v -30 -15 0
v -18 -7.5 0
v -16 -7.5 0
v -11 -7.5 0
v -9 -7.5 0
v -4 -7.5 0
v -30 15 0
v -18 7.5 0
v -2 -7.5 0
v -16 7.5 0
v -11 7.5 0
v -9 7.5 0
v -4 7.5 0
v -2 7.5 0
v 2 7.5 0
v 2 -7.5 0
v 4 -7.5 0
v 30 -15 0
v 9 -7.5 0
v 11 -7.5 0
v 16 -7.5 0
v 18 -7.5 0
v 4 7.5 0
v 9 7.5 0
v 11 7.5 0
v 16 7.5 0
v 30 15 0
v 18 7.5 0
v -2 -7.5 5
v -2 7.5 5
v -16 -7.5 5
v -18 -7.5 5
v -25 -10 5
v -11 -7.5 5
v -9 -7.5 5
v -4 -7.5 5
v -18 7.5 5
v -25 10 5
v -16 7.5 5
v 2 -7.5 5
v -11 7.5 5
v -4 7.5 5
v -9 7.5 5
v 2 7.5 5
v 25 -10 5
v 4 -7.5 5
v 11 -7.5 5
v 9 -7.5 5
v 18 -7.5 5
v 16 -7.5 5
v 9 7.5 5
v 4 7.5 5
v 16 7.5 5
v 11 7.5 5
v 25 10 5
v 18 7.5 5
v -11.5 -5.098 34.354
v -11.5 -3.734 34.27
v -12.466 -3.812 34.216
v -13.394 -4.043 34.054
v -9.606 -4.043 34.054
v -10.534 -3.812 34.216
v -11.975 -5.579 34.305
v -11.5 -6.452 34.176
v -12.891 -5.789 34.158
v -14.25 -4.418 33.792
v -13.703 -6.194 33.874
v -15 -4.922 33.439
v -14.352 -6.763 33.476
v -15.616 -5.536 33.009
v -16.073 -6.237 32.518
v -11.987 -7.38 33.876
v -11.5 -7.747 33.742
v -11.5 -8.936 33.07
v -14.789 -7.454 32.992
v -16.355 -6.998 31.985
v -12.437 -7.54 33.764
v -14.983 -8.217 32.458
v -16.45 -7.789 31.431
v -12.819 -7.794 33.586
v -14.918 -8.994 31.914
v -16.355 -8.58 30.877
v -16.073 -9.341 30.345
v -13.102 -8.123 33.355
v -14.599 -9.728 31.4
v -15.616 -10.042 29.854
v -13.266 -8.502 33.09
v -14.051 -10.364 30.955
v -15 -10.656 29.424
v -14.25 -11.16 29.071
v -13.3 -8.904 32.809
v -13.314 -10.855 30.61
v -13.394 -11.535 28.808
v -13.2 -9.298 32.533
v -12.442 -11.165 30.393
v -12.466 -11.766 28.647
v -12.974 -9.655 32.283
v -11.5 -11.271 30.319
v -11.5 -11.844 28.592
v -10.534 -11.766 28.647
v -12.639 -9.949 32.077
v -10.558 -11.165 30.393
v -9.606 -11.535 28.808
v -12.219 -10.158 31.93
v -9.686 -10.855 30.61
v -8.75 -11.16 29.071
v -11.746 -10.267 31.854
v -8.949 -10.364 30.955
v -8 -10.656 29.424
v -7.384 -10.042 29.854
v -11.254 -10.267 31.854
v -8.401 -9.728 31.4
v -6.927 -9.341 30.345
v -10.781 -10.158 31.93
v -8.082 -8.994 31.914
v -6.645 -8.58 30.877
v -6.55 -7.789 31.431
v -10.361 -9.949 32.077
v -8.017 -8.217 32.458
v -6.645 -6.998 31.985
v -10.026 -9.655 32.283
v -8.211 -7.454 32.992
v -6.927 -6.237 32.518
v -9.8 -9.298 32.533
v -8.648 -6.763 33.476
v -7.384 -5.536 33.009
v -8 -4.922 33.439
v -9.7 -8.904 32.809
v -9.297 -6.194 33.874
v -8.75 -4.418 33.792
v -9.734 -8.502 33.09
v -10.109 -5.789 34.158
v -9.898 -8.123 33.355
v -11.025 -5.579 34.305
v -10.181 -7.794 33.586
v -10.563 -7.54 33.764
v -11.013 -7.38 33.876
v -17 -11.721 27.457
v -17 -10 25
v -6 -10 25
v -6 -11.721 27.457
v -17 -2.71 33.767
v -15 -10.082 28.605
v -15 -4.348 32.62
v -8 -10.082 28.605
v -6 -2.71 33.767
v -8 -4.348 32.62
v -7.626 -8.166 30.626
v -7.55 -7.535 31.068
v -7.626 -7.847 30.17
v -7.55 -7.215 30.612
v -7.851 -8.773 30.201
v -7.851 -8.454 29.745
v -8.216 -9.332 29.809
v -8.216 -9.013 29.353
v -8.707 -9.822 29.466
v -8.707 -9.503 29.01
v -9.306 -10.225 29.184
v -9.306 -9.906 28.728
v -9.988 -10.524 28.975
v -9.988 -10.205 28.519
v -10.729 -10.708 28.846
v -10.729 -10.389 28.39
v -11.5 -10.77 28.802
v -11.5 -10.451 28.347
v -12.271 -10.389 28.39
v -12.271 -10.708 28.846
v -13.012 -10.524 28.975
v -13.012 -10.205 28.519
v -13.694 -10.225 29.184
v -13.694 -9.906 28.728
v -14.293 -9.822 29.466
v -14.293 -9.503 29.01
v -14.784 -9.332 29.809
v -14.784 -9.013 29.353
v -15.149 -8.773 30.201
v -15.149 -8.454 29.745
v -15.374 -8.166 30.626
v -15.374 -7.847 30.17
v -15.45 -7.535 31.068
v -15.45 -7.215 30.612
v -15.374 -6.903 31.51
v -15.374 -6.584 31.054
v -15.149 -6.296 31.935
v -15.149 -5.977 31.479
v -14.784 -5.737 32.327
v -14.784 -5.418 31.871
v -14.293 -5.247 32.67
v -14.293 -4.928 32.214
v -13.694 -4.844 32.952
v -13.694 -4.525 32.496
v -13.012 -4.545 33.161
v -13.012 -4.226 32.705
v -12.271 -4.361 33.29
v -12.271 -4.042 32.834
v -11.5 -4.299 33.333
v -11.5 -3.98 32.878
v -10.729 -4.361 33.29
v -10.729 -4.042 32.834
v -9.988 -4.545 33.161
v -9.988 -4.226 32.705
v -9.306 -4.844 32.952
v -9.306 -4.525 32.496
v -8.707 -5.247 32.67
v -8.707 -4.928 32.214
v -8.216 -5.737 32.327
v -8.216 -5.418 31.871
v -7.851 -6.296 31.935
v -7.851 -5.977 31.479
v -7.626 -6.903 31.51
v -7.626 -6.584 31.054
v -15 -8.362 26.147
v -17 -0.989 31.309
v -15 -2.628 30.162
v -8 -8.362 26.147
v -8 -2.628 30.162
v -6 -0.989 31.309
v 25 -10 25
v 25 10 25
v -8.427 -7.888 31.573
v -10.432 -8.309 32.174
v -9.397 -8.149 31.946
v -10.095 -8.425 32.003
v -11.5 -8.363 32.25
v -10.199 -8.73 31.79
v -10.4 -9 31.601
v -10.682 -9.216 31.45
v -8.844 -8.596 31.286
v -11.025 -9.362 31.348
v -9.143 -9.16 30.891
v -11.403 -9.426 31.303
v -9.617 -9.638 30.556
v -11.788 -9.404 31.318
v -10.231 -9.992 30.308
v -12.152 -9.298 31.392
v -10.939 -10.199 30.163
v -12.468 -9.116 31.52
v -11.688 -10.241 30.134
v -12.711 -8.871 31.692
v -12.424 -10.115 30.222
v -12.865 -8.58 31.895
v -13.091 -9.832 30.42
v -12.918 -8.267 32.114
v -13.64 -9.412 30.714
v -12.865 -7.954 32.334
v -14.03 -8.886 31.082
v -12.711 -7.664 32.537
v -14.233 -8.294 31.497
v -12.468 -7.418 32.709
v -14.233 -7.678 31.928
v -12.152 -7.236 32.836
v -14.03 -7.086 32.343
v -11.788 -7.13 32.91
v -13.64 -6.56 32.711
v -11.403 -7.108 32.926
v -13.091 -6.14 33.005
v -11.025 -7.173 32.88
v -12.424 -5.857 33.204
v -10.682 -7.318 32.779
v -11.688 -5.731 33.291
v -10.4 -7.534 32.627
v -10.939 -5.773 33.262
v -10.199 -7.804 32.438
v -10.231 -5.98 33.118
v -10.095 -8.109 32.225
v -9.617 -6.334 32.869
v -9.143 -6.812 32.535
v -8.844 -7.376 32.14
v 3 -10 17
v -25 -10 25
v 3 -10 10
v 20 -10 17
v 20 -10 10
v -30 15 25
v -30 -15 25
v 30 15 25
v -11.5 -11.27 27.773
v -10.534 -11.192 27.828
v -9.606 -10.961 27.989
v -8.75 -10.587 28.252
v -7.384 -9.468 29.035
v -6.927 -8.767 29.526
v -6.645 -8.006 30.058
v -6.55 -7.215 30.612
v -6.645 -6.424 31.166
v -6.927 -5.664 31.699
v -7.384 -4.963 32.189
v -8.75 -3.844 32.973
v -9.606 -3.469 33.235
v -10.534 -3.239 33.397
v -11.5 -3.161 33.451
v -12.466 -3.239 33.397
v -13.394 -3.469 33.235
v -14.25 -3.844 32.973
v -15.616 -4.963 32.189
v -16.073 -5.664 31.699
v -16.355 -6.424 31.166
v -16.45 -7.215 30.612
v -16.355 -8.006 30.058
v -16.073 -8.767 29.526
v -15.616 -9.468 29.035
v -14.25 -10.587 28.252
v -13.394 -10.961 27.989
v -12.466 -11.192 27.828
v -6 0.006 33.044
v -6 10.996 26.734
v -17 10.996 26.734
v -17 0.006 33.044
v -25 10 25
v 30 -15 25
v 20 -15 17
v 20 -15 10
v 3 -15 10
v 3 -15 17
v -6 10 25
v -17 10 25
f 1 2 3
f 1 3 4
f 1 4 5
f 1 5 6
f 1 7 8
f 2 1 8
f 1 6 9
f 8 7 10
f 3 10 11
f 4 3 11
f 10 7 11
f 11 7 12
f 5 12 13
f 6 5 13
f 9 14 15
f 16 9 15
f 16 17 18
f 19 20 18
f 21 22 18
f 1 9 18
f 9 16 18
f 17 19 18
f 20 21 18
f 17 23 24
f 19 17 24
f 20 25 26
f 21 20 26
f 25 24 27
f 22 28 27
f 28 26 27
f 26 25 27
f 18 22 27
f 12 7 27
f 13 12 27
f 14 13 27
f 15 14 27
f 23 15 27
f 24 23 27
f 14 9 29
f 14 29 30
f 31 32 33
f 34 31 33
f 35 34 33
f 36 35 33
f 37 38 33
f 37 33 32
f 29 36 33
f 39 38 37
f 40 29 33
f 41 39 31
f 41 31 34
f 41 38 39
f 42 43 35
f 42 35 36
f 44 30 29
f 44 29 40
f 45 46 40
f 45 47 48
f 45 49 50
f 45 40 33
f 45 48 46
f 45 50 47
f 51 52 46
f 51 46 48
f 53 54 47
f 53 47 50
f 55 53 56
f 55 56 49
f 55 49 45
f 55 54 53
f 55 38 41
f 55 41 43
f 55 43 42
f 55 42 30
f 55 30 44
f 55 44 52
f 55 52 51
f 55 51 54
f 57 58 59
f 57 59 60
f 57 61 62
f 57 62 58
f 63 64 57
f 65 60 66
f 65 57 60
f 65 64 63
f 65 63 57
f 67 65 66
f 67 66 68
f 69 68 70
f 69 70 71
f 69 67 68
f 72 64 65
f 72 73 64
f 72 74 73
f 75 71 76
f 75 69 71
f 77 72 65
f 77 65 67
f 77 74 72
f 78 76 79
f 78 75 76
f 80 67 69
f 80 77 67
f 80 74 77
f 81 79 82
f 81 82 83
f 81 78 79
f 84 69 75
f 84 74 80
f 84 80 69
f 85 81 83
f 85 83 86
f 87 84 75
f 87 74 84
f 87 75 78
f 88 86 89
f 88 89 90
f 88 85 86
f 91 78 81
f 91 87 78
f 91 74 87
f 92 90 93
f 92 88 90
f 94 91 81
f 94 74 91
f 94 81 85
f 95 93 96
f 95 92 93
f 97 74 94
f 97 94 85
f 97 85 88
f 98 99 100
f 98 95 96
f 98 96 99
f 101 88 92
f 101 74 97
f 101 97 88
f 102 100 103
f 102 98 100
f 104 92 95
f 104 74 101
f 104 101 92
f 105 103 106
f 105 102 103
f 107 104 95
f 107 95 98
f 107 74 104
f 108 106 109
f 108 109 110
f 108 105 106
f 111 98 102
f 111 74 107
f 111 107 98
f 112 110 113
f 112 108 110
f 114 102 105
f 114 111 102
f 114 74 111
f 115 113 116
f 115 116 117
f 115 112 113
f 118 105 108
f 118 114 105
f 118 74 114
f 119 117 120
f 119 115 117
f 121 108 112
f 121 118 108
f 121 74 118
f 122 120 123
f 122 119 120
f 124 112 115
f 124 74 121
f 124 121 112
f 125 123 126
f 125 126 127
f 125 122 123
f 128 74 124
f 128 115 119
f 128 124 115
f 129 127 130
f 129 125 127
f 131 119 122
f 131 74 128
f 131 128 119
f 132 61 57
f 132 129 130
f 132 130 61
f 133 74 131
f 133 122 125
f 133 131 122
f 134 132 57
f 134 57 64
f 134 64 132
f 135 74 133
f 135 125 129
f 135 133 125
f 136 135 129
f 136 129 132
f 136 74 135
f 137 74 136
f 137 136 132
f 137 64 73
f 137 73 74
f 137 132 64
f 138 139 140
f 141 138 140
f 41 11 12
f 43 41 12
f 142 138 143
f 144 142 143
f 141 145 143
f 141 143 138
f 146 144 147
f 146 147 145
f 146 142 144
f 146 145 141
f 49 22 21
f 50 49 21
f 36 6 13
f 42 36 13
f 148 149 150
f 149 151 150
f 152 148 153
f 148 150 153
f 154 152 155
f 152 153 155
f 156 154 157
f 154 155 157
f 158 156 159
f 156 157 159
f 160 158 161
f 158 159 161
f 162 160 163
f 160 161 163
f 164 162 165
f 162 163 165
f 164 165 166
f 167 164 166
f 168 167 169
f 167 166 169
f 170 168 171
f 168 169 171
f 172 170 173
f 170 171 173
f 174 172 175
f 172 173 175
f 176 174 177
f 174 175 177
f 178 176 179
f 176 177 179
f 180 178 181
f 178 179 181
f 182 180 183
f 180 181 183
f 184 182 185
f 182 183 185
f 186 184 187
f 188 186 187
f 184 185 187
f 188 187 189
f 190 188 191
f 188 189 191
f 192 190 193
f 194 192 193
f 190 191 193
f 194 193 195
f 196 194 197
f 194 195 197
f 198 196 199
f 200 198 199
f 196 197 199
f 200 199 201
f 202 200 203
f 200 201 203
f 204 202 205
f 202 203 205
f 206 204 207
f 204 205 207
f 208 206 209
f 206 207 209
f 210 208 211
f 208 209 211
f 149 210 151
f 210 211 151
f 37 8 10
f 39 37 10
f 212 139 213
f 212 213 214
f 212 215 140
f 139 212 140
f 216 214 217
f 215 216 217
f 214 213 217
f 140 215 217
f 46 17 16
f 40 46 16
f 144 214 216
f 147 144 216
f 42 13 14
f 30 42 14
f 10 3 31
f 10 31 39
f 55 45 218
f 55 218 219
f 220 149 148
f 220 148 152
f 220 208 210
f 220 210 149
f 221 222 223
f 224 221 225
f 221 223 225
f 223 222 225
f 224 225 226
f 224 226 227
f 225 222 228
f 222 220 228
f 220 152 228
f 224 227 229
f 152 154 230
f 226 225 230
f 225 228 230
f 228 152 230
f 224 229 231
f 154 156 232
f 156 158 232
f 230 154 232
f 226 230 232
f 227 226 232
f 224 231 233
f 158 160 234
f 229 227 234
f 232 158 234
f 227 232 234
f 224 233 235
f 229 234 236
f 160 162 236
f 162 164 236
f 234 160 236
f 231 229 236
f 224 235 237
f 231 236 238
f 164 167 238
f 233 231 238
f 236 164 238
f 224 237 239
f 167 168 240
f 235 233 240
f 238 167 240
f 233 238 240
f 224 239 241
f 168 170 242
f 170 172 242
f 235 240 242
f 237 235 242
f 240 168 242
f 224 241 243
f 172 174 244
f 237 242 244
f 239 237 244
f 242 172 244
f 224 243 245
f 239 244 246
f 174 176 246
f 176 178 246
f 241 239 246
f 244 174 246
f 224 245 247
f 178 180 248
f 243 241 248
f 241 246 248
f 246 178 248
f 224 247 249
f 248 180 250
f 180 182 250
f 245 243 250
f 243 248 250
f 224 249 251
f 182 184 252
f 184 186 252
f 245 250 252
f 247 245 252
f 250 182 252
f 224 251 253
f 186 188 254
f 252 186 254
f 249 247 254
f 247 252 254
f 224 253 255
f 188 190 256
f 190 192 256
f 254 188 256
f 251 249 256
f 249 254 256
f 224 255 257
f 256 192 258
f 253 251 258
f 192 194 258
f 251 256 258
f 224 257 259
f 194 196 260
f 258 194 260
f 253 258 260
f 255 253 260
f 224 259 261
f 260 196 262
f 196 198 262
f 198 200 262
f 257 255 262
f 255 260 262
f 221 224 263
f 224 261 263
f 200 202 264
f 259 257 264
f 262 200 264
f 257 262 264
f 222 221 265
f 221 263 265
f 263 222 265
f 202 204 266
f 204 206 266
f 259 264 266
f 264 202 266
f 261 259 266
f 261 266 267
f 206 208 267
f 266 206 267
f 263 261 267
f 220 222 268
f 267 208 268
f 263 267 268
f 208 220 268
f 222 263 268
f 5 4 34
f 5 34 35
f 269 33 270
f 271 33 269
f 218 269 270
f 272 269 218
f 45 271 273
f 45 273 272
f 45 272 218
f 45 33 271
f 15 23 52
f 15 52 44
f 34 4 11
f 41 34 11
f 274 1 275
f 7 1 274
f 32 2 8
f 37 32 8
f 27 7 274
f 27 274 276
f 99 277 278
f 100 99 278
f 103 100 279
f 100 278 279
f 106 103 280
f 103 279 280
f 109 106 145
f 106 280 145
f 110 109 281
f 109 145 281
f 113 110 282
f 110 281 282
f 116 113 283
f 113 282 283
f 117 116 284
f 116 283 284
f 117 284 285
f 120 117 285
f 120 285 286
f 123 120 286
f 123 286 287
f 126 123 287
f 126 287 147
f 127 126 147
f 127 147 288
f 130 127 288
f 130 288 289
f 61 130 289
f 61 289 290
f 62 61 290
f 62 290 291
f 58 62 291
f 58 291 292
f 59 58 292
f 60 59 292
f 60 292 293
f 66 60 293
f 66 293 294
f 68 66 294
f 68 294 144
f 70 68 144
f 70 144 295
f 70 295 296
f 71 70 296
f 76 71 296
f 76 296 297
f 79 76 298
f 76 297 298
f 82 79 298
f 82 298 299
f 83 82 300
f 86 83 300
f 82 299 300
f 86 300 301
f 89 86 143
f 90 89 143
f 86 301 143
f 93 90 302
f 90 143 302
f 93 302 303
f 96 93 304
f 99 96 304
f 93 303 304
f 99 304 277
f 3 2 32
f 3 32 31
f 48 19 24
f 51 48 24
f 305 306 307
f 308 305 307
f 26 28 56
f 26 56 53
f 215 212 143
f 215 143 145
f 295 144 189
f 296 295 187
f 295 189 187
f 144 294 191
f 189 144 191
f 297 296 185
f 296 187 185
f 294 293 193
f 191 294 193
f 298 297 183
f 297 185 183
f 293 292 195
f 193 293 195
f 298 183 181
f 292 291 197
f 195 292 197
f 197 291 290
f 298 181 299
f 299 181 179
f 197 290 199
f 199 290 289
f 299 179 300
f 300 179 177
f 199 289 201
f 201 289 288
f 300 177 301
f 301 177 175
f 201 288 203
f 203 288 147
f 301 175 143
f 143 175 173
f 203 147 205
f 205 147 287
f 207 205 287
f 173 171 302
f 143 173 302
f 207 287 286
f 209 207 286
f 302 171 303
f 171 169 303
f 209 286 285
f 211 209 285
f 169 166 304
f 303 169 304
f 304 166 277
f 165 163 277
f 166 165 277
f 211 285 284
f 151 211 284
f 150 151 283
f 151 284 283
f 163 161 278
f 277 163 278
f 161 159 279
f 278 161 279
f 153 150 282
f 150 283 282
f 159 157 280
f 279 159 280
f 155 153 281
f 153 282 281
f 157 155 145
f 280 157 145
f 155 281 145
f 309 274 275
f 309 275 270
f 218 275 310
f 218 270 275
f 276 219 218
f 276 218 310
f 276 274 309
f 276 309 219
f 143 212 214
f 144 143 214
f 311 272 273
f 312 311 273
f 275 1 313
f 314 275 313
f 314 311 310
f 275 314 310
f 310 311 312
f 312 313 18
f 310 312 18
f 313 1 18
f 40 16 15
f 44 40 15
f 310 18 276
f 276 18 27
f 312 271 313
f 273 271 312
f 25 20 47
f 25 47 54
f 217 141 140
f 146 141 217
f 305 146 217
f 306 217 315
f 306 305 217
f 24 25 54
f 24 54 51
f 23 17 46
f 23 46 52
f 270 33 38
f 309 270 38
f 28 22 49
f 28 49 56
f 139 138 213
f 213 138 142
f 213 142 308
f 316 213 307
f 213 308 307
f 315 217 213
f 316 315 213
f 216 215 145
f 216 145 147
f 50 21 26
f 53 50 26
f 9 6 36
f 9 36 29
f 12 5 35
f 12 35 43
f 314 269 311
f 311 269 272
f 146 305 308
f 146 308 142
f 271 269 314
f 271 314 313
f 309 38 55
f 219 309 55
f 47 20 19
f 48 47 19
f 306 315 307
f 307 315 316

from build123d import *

# Parameters (mm, degrees)
SKETCH1_W           = 60
SKETCH1_H           = 30
BOSS_EXTRUDE1_DEPTH = 5
SKETCH3_W           = 60
SKETCH3_H           = 30
SKETCH3_W_2         = 50
SKETCH3_H_2         = 20
BOSS_EXTRUDE2_DEPTH = 20
SKETCH4_W           = 2
SKETCH4_H           = 15
CUT_EXTRUDE1_DEPTH  = 20
SKETCH5_W           = 17
SKETCH5_H           = 7
CUT_EXTRUDE2_DEPTH  = 20
SKETCH6_W           = 11
SKETCH6_H           = 11
SKETCH6_W_2         = 7
SKETCH6_H_2         = 7
BOSS_EXTRUDE3_DEPTH = 3
BOSS_EXTRUDE5_START = 3
SKETCH10_R          = 4.949747468
BOSS_EXTRUDE5_DEPTH = 1
DOME5_FACE_RADIUS   = 4.949747468
DOME5_HEIGHT        = 2
SKETCH12_W          = 11
SKETCH12_H          = 12.671744178
BOSS_EXTRUDE9_DEPTH = 2
LOFT1_START         = -17
LOFT1_DEPTH         = 11


# Read off the part's stored shape, not the designer's step: Shell1, Loft1
with BuildPart() as part:
    # Sketch1 → Boss-Extrude1 (new body)
    with BuildSketch(Plane.XY):
        Rectangle(SKETCH1_W, SKETCH1_H)
    extrude(amount=BOSS_EXTRUDE1_DEPTH)

    # Sketch3 → Boss-Extrude2 (add)
    with BuildSketch(Plane.XY.offset(5)):
        Rectangle(SKETCH3_W, SKETCH3_H)
        Rectangle(SKETCH3_W_2, SKETCH3_H_2, mode=Mode.SUBTRACT)
    extrude(amount=BOSS_EXTRUDE2_DEPTH)

    # Sketch4 → Cut-Extrude1 (cut)
    with BuildSketch(Plane(origin=(0, 0, 0), x_dir=(-1, 0, 0), z_dir=(0, 0, -1))):
        with Locations((-17, 0)):
            Rectangle(SKETCH4_W, SKETCH4_H)
        with Locations((-10, 0)):
            Rectangle(SKETCH4_W, SKETCH4_H)
        with Locations((-3, 0)):
            Rectangle(SKETCH4_W, SKETCH4_H)
    cut_extrude1 = extrude(amount=-CUT_EXTRUDE1_DEPTH, mode=Mode.SUBTRACT)

    # Mirror1: Cut-Extrude1 across plane
    add(cut_extrude1.mirror(Plane(origin=(0, 0, 0), x_dir=(0, 0, 1), z_dir=(1, 0, 0))), mode=Mode.SUBTRACT)

    # Sketch5 → Cut-Extrude2 (cut)
    with BuildSketch(Plane(origin=(0, -10, 0), x_dir=(1, 0, 0), z_dir=(0, 1, 0))):
        with Locations((11.5, -13.5)):
            Rectangle(SKETCH5_W, SKETCH5_H)
    extrude(amount=-CUT_EXTRUDE2_DEPTH, mode=Mode.SUBTRACT)


with BuildPart() as body_2:
    # Sketch6 → Boss-Extrude3 (new body)
    with BuildSketch(Plane(origin=(0, -15.036057043, 21.473714896), x_dir=(1, 0, 0), z_dir=(0, -0.5735764363510473, 0.819152044288991))):
        with Locations((-11.5, 11.647890466)):
            Rectangle(SKETCH6_W, SKETCH6_H)
        with Locations((-11.5, 11.647890466)):
            Rectangle(SKETCH6_W_2, SKETCH6_H_2, mode=Mode.SUBTRACT)
    extrude(amount=BOSS_EXTRUDE3_DEPTH)



with BuildPart() as body_3:
    # Sketch10 → Boss-Extrude5 (new body)
    with BuildSketch(Plane(origin=(0, -15.036057043, 21.473714896), x_dir=(1, 0, 0), z_dir=(0, -0.5735764363510473, 0.819152044288991)).offset(BOSS_EXTRUDE5_START)):
        with Locations(Location((-11.5, 11.647890466, 0), (0, 0, 270))):
            Circle(SKETCH10_R)
    extrude(amount=BOSS_EXTRUDE5_DEPTH)

    # Dome5: a dome of height H over a round flat face of radius A is a cap of a sphere of radius (A * A + H * H) / (2 * H)
    dome5_r = (DOME5_FACE_RADIUS * DOME5_FACE_RADIUS + DOME5_HEIGHT * DOME5_HEIGHT) / (2 * DOME5_HEIGHT)
    dome5_base = Plane((-11.5, -7.788969502, 31.431278577), z_dir=(0, -0.573576436351, 0.819152044289))
    with Locations(dome5_base.offset(DOME5_HEIGHT - dome5_r)):
        dome5_ball = Sphere(dome5_r, mode=Mode.PRIVATE)
    add(split(dome5_ball, bisect_by=dome5_base, keep=Keep.TOP, mode=Mode.PRIVATE))

    # Shell1 outline → Shell1 (revolve, cut)
    with BuildSketch(Plane(origin=(-11.5, 9.541393287, 6.680955504), x_dir=(1, 0, 0), z_dir=(0, 0.8191520442889911, 0.5735764363510472))):
        with BuildLine():
            ThreePointArc((0, -31.214565471), (2.10265339, -30.842345123), (3.949747473, -29.770924237))
            Line((3.949747473, -29.770924237), (3.949747468, -29.214565471))
            Line((3.949747468, -29.214565471), (0, -29.214565471))
            Line((0, -29.214565471), (0, -31.214565471))
        make_face()
    revolve(axis=Axis((-11.5, 9.541393287, 6.680955504), (0, 0.5735764363510472, -0.8191520442889911)), mode=Mode.SUBTRACT)


with BuildPart() as body_4:
    # Sketch12 → Boss-Extrude9 (new body)
    with BuildSketch(Plane(origin=(0, 13.274098323, 23.12023055), x_dir=(-1, 0, 0), z_dir=(0, -0.4979062638284767, -0.8672308530260945))):
        with Locations((11.5, -10.111220154)):
            Rectangle(SKETCH12_W, SKETCH12_H)
    extrude(amount=-BOSS_EXTRUDE9_DEPTH)


with BuildPart() as body_2_1:
    add(body_2.part)

    add(body_4.part)  # Loft1 merges body 4
    # Loft1 outline → Loft1 (add)
    with BuildSketch(Plane.YZ.offset(LOFT1_START)):
        Polygon((-0.989327513, 31.3093408), (0.006485015, 33.043802506), (-2.710056822, 33.766796933), align=None)
    extrude(amount=LOFT1_DEPTH)


solid = Compound([part.part, body_3.part, body_2_1.part])
